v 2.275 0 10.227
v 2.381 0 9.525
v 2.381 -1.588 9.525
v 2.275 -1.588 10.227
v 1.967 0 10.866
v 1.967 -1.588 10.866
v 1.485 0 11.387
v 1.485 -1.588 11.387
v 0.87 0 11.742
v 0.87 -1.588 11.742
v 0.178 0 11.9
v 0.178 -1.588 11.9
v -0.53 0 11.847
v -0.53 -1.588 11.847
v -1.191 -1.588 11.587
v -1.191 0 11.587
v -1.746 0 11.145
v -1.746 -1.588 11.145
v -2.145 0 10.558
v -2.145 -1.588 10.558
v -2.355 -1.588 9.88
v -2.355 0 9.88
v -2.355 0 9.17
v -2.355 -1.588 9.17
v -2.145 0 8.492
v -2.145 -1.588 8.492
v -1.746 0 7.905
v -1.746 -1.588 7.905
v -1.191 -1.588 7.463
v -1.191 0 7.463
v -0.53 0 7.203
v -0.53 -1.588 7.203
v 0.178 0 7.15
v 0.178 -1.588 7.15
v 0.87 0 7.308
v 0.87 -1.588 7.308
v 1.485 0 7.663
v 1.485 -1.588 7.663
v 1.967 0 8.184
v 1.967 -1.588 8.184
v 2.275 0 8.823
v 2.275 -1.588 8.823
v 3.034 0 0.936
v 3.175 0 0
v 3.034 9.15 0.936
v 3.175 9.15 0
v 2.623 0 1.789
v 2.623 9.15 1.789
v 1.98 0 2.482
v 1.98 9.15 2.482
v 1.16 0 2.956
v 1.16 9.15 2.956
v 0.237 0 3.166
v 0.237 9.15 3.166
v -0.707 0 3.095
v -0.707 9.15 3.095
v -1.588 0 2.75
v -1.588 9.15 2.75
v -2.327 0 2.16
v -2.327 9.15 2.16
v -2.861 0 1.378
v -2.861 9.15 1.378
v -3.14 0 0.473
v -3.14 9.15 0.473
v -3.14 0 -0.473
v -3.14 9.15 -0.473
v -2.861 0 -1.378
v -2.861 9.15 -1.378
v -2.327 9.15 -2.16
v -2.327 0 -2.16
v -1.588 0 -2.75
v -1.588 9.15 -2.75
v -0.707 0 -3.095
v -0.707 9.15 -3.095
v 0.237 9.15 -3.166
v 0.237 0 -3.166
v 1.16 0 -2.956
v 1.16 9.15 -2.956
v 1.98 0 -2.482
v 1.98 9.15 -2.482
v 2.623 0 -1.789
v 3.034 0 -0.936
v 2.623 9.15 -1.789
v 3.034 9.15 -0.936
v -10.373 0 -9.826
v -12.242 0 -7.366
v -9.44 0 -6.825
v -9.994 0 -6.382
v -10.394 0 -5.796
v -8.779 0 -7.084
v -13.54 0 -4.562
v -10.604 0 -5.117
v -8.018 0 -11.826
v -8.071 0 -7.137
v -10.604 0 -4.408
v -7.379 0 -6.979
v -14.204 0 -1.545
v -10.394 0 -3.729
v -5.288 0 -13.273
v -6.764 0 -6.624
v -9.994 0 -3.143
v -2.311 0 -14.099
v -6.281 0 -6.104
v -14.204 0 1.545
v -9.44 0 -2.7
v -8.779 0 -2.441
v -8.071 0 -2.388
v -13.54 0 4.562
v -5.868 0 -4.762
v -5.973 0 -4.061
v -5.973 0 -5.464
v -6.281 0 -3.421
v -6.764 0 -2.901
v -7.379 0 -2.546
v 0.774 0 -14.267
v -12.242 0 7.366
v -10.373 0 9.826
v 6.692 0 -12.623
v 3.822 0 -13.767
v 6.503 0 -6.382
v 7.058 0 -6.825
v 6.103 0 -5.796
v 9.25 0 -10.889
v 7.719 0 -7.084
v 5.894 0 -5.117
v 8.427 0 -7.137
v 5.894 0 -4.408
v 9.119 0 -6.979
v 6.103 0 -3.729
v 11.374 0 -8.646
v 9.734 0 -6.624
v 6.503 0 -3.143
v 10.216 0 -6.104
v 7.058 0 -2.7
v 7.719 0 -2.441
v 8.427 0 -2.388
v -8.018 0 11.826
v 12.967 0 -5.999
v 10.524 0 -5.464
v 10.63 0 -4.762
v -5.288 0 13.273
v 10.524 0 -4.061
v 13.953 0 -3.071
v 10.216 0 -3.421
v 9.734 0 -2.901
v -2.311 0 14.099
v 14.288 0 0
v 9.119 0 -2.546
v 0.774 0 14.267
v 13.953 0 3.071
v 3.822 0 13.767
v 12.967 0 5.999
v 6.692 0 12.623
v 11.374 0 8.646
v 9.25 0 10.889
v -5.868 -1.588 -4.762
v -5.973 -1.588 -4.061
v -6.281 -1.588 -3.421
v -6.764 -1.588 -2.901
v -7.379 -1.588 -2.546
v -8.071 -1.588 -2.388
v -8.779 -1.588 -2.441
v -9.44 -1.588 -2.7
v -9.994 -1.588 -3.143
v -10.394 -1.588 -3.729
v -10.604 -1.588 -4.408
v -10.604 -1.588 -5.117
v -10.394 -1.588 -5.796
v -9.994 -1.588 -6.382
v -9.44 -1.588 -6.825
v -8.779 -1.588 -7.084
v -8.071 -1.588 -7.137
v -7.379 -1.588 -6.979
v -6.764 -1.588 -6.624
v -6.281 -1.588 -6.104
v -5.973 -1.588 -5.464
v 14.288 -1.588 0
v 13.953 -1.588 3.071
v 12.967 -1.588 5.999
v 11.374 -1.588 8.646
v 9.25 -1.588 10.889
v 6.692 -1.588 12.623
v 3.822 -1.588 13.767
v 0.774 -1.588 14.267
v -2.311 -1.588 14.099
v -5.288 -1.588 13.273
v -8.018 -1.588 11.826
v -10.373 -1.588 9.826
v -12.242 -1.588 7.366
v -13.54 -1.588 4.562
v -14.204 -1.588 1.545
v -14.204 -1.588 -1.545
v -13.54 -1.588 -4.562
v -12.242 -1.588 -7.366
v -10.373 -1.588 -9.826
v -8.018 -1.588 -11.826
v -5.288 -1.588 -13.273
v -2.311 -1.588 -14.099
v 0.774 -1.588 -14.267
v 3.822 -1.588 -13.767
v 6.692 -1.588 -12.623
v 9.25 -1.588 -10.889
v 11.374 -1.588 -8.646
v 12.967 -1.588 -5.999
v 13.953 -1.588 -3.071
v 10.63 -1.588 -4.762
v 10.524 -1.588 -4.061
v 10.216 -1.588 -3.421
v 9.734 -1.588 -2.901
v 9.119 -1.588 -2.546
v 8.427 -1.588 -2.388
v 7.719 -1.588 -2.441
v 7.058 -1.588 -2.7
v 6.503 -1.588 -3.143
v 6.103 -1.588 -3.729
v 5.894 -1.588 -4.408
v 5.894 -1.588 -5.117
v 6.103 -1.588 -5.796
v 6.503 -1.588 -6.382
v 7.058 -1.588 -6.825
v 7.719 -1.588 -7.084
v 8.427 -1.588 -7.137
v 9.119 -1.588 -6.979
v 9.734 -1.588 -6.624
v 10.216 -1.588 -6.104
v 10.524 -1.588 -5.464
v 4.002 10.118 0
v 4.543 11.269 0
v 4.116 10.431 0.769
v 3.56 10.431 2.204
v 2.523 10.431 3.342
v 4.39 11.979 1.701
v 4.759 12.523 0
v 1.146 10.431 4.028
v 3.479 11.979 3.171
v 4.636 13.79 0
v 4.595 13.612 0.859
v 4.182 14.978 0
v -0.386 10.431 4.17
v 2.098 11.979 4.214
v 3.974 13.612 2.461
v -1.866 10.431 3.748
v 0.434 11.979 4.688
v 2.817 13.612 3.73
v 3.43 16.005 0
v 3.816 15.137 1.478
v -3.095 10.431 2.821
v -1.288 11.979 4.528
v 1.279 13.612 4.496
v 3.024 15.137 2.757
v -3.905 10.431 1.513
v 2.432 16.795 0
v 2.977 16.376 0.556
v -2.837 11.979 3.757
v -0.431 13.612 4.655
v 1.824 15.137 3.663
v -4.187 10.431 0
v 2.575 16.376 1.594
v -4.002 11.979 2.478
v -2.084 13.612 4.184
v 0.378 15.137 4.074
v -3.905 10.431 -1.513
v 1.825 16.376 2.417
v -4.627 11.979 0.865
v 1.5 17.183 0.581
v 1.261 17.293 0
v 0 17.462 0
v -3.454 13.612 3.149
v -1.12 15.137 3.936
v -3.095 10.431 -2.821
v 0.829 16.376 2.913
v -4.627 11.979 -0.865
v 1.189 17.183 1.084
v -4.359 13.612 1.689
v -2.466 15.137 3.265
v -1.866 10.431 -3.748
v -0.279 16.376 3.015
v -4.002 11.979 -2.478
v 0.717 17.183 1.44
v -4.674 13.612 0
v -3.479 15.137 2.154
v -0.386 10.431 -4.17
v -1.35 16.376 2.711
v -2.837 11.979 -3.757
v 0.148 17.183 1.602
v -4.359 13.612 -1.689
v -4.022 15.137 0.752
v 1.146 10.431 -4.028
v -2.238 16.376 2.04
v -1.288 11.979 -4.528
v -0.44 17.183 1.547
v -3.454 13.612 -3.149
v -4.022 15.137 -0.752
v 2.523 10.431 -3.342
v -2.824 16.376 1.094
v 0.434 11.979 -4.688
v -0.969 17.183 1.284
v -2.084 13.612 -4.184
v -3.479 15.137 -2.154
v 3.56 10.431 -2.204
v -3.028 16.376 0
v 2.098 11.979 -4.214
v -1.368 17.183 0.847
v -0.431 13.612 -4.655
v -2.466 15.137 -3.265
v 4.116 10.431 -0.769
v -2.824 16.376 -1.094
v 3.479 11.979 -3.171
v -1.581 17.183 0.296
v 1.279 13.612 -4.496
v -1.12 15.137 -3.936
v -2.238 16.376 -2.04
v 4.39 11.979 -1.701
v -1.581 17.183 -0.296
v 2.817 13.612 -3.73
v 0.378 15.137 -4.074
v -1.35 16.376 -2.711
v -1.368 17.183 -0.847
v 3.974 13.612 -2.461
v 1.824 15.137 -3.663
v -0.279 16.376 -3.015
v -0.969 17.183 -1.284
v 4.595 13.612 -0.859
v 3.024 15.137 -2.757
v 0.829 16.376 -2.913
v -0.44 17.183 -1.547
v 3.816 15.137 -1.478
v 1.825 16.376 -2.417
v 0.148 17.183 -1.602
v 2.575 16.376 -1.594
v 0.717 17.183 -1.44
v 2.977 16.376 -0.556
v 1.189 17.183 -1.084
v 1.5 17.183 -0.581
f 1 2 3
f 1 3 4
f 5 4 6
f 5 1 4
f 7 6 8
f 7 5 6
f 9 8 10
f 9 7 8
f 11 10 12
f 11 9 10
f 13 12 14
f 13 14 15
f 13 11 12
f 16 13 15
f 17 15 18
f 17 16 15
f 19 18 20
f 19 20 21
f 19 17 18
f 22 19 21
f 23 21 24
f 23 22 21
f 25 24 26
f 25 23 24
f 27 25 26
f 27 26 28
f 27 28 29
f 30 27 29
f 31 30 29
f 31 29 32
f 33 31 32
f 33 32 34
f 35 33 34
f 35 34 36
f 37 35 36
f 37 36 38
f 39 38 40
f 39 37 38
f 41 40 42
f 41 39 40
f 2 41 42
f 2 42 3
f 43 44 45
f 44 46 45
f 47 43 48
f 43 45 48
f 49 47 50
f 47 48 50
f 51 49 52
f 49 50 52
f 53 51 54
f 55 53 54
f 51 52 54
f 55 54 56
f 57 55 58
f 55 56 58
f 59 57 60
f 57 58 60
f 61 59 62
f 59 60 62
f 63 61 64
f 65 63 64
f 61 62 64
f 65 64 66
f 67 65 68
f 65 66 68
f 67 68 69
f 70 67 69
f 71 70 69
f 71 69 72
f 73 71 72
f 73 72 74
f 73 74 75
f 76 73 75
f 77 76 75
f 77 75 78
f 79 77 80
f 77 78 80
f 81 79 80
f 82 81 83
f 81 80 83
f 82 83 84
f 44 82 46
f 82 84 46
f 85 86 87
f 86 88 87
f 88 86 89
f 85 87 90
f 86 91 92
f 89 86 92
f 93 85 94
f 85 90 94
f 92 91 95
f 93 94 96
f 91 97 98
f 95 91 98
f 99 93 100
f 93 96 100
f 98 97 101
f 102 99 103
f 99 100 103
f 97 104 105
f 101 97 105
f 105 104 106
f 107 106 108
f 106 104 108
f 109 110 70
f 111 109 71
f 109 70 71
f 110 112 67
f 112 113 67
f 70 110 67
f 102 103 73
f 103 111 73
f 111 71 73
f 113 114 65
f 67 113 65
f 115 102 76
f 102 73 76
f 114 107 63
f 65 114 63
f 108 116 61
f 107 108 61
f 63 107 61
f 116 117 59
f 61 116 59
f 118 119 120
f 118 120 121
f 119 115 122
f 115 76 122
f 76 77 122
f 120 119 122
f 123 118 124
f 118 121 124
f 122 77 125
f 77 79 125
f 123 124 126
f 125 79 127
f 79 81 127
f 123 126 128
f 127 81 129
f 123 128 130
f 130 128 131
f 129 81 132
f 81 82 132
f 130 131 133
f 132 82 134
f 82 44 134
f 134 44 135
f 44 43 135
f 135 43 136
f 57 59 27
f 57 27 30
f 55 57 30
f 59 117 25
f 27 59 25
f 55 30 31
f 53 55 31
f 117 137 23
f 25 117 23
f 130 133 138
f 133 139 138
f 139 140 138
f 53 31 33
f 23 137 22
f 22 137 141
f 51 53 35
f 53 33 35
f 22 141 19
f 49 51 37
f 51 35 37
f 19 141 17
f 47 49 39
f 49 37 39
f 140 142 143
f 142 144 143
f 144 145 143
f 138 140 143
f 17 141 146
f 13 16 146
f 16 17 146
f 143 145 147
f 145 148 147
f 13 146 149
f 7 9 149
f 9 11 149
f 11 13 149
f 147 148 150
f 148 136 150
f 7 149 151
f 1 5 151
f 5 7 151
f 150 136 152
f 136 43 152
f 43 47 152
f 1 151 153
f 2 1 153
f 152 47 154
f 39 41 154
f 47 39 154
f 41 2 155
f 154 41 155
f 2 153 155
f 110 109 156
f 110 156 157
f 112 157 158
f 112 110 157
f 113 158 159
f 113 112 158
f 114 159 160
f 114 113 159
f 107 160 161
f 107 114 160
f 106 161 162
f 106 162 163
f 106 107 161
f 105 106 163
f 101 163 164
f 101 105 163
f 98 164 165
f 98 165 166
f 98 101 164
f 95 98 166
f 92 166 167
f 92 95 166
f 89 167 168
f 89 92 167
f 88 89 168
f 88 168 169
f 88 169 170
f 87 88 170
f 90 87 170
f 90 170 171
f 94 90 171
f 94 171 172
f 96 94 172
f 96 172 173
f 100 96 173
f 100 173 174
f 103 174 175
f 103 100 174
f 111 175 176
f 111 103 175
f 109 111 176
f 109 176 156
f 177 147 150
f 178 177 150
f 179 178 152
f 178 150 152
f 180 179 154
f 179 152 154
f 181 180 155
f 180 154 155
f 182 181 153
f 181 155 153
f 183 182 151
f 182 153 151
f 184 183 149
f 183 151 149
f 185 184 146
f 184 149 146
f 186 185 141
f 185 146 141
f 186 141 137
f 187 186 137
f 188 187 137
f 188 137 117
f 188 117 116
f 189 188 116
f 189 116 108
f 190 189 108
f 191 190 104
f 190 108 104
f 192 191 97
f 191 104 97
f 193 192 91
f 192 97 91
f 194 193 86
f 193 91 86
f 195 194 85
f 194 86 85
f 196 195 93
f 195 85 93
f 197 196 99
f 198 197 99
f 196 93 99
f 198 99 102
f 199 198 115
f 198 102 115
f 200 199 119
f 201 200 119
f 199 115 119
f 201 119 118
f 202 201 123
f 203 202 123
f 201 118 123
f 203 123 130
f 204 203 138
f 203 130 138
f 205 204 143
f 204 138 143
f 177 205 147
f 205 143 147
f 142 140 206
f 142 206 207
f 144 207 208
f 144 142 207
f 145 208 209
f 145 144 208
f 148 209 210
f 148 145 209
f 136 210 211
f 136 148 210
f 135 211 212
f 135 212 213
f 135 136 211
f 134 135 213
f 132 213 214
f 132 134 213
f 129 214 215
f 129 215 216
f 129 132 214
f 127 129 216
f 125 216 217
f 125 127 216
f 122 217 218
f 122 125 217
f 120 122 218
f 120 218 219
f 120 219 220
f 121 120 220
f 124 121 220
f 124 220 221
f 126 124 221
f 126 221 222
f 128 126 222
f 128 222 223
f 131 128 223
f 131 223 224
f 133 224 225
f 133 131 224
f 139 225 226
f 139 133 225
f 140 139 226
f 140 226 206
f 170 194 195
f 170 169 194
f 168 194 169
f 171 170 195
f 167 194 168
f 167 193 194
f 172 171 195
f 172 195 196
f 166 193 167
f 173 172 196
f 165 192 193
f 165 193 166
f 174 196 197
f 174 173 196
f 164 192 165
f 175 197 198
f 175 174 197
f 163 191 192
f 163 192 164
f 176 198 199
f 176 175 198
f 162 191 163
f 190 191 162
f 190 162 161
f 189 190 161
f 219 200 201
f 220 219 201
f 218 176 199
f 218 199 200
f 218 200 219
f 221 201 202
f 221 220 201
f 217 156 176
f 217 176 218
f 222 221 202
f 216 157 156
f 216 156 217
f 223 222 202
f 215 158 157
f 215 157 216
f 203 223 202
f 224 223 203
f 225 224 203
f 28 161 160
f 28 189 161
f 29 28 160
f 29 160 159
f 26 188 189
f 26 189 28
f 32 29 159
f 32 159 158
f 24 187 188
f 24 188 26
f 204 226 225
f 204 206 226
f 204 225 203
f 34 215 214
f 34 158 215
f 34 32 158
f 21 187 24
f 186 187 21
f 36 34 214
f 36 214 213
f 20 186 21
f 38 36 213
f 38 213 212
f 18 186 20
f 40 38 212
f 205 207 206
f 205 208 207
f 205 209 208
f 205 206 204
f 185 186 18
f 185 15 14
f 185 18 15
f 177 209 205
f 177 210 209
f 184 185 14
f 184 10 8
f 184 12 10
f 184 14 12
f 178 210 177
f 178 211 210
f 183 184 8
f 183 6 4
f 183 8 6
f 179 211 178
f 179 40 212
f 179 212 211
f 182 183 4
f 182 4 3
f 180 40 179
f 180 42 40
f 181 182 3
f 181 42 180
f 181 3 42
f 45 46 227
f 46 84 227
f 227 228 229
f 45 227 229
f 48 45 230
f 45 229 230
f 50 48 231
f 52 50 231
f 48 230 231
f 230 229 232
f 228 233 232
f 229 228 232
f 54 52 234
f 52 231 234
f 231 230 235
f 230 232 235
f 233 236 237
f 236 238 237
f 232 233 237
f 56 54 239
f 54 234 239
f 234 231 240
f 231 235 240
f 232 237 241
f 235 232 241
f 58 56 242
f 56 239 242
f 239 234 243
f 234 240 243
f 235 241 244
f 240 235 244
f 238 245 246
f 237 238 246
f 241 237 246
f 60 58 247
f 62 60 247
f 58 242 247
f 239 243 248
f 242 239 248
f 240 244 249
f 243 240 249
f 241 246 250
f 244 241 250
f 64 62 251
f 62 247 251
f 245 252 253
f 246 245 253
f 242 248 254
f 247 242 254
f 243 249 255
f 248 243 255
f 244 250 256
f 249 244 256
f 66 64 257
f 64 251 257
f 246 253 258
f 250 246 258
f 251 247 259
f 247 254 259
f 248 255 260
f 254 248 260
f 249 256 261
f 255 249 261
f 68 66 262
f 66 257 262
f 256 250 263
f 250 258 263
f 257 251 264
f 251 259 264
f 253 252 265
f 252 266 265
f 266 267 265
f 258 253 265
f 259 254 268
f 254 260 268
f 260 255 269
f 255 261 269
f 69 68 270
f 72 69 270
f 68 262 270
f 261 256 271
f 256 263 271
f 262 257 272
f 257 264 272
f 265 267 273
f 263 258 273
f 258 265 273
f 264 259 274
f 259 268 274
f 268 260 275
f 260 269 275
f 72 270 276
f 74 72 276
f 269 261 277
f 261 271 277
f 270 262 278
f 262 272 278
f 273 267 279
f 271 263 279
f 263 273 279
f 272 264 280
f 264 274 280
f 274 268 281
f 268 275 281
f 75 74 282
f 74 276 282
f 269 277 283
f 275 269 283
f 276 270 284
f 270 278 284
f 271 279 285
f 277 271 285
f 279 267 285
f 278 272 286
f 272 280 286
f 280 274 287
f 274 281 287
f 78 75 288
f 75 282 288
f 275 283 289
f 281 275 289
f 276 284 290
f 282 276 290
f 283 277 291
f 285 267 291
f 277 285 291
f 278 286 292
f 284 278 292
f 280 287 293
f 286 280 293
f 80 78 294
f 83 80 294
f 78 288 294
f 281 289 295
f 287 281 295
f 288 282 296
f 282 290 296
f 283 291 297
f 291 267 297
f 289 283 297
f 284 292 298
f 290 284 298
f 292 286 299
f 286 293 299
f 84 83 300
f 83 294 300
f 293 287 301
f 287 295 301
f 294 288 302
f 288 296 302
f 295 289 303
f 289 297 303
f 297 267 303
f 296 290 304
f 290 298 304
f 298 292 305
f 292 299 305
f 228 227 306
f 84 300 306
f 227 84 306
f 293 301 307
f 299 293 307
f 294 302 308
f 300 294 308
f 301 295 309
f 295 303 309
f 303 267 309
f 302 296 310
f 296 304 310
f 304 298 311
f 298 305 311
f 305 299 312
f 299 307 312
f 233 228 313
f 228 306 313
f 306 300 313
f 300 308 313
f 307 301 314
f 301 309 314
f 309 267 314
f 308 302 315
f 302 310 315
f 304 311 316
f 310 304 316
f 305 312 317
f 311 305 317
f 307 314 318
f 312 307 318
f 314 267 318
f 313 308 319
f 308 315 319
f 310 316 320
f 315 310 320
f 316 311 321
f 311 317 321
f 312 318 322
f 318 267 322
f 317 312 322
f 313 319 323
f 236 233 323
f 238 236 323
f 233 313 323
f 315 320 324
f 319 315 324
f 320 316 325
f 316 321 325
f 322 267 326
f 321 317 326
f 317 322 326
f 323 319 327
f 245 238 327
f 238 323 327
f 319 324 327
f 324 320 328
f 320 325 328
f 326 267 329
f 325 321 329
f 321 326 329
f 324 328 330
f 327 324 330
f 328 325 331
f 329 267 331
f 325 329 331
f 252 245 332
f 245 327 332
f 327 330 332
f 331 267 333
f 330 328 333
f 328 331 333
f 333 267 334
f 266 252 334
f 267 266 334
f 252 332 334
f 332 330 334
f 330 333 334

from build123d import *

# Parameters (mm, degrees)
F0_R     = 14.2875
F0_R_2   = 2.38125
F1_DEPTH = 1.5875


with BuildPart() as f1:
    # F0 (on Front) → F1 (new body)
    with BuildSketch(Plane.XZ):
        Circle(F0_R)
        with Locations((-8.248891971, -4.7625)):
            Circle(F0_R_2, mode=Mode.SUBTRACT)
        with Locations((8.248891971, -4.7625)):
            Circle(F0_R_2, mode=Mode.SUBTRACT)
        with Locations((0, 9.525)):
            Circle(F0_R_2, mode=Mode.SUBTRACT)
    extrude(amount=F1_DEPTH)

    # F2 (on Top) → F3 (revolve)
    with BuildSketch(Plane.XY):
        with BuildLine():
            Line((0, 0), (3.175, 0))
            Line((3.175, 0), (3.175, 9.1502420857))
            ThreePointArc((3.175, 9.1502420857), (1.6993652025, 8.2510041404), (0, 7.9375))
            Line((0, 7.9375), (0, 0))
        make_face()
        with BuildLine():
            ThreePointArc((0, 7.9375), (1.6993652025, 8.2510041404), (3.175, 9.1502420857))
            ThreePointArc((3.175, 9.1502420857), (4.4489958596, 14.3993652025), (0, 17.4625))
            Line((0, 17.4625), (0, 12.7))
            Line((0, 12.7), (0, 7.9375))
        make_face()
    revolve(axis=Axis((0, 6.35, 0), (0, -1, 0)))


solid = f1.part
